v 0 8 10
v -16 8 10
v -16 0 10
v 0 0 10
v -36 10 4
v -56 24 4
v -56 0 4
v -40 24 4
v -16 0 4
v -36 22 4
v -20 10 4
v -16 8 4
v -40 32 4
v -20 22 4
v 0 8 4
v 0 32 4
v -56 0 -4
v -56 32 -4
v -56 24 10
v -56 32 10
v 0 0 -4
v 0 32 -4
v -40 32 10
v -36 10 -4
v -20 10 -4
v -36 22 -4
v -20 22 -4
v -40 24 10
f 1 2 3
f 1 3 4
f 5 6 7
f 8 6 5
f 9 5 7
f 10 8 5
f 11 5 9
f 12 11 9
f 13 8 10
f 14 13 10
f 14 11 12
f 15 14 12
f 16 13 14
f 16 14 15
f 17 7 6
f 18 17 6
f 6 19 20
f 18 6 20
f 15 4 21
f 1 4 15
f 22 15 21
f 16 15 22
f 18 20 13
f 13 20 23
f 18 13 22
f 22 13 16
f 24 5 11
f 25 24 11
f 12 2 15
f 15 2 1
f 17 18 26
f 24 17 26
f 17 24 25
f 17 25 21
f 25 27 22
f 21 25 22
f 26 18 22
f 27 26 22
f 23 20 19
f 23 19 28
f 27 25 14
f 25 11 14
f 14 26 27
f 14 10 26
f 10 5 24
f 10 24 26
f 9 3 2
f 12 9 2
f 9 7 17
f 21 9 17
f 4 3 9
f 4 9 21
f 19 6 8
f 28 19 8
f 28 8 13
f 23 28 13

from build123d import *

# Parameters (mm, degrees)
SKETCH1_W           = 56
SKETCH1_H           = 32
SKETCH1_W_2         = 16
SKETCH1_H_2         = 12
BOSS_EXTRUDE1_DEPTH = 4
SKETCH2_W           = 16
SKETCH2_H           = 8
BOSS_EXTRUDE3_DEPTH = 6


with BuildPart() as part:
    # Sketch1 → Boss-Extrude1 (new, symmetric)
    with BuildSketch(Plane.XY):
        with Locations((-28, 16)):
            Rectangle(SKETCH1_W, SKETCH1_H)
        with Locations((-28, 16)):
            Rectangle(SKETCH1_W_2, SKETCH1_H_2, mode=Mode.SUBTRACT)
    extrude(amount=BOSS_EXTRUDE1_DEPTH, both=True)

    # Sketch2 → Boss-Extrude3 (add, symmetric)
    with BuildSketch(Plane.XY.offset(4)):
        with Locations((-48, 28)):
            Rectangle(SKETCH2_W, SKETCH2_H)
        with Locations((-8, 4)):
            Rectangle(SKETCH2_W, SKETCH2_H)
    extrude(amount=BOSS_EXTRUDE3_DEPTH, both=True)


solid = part.part
